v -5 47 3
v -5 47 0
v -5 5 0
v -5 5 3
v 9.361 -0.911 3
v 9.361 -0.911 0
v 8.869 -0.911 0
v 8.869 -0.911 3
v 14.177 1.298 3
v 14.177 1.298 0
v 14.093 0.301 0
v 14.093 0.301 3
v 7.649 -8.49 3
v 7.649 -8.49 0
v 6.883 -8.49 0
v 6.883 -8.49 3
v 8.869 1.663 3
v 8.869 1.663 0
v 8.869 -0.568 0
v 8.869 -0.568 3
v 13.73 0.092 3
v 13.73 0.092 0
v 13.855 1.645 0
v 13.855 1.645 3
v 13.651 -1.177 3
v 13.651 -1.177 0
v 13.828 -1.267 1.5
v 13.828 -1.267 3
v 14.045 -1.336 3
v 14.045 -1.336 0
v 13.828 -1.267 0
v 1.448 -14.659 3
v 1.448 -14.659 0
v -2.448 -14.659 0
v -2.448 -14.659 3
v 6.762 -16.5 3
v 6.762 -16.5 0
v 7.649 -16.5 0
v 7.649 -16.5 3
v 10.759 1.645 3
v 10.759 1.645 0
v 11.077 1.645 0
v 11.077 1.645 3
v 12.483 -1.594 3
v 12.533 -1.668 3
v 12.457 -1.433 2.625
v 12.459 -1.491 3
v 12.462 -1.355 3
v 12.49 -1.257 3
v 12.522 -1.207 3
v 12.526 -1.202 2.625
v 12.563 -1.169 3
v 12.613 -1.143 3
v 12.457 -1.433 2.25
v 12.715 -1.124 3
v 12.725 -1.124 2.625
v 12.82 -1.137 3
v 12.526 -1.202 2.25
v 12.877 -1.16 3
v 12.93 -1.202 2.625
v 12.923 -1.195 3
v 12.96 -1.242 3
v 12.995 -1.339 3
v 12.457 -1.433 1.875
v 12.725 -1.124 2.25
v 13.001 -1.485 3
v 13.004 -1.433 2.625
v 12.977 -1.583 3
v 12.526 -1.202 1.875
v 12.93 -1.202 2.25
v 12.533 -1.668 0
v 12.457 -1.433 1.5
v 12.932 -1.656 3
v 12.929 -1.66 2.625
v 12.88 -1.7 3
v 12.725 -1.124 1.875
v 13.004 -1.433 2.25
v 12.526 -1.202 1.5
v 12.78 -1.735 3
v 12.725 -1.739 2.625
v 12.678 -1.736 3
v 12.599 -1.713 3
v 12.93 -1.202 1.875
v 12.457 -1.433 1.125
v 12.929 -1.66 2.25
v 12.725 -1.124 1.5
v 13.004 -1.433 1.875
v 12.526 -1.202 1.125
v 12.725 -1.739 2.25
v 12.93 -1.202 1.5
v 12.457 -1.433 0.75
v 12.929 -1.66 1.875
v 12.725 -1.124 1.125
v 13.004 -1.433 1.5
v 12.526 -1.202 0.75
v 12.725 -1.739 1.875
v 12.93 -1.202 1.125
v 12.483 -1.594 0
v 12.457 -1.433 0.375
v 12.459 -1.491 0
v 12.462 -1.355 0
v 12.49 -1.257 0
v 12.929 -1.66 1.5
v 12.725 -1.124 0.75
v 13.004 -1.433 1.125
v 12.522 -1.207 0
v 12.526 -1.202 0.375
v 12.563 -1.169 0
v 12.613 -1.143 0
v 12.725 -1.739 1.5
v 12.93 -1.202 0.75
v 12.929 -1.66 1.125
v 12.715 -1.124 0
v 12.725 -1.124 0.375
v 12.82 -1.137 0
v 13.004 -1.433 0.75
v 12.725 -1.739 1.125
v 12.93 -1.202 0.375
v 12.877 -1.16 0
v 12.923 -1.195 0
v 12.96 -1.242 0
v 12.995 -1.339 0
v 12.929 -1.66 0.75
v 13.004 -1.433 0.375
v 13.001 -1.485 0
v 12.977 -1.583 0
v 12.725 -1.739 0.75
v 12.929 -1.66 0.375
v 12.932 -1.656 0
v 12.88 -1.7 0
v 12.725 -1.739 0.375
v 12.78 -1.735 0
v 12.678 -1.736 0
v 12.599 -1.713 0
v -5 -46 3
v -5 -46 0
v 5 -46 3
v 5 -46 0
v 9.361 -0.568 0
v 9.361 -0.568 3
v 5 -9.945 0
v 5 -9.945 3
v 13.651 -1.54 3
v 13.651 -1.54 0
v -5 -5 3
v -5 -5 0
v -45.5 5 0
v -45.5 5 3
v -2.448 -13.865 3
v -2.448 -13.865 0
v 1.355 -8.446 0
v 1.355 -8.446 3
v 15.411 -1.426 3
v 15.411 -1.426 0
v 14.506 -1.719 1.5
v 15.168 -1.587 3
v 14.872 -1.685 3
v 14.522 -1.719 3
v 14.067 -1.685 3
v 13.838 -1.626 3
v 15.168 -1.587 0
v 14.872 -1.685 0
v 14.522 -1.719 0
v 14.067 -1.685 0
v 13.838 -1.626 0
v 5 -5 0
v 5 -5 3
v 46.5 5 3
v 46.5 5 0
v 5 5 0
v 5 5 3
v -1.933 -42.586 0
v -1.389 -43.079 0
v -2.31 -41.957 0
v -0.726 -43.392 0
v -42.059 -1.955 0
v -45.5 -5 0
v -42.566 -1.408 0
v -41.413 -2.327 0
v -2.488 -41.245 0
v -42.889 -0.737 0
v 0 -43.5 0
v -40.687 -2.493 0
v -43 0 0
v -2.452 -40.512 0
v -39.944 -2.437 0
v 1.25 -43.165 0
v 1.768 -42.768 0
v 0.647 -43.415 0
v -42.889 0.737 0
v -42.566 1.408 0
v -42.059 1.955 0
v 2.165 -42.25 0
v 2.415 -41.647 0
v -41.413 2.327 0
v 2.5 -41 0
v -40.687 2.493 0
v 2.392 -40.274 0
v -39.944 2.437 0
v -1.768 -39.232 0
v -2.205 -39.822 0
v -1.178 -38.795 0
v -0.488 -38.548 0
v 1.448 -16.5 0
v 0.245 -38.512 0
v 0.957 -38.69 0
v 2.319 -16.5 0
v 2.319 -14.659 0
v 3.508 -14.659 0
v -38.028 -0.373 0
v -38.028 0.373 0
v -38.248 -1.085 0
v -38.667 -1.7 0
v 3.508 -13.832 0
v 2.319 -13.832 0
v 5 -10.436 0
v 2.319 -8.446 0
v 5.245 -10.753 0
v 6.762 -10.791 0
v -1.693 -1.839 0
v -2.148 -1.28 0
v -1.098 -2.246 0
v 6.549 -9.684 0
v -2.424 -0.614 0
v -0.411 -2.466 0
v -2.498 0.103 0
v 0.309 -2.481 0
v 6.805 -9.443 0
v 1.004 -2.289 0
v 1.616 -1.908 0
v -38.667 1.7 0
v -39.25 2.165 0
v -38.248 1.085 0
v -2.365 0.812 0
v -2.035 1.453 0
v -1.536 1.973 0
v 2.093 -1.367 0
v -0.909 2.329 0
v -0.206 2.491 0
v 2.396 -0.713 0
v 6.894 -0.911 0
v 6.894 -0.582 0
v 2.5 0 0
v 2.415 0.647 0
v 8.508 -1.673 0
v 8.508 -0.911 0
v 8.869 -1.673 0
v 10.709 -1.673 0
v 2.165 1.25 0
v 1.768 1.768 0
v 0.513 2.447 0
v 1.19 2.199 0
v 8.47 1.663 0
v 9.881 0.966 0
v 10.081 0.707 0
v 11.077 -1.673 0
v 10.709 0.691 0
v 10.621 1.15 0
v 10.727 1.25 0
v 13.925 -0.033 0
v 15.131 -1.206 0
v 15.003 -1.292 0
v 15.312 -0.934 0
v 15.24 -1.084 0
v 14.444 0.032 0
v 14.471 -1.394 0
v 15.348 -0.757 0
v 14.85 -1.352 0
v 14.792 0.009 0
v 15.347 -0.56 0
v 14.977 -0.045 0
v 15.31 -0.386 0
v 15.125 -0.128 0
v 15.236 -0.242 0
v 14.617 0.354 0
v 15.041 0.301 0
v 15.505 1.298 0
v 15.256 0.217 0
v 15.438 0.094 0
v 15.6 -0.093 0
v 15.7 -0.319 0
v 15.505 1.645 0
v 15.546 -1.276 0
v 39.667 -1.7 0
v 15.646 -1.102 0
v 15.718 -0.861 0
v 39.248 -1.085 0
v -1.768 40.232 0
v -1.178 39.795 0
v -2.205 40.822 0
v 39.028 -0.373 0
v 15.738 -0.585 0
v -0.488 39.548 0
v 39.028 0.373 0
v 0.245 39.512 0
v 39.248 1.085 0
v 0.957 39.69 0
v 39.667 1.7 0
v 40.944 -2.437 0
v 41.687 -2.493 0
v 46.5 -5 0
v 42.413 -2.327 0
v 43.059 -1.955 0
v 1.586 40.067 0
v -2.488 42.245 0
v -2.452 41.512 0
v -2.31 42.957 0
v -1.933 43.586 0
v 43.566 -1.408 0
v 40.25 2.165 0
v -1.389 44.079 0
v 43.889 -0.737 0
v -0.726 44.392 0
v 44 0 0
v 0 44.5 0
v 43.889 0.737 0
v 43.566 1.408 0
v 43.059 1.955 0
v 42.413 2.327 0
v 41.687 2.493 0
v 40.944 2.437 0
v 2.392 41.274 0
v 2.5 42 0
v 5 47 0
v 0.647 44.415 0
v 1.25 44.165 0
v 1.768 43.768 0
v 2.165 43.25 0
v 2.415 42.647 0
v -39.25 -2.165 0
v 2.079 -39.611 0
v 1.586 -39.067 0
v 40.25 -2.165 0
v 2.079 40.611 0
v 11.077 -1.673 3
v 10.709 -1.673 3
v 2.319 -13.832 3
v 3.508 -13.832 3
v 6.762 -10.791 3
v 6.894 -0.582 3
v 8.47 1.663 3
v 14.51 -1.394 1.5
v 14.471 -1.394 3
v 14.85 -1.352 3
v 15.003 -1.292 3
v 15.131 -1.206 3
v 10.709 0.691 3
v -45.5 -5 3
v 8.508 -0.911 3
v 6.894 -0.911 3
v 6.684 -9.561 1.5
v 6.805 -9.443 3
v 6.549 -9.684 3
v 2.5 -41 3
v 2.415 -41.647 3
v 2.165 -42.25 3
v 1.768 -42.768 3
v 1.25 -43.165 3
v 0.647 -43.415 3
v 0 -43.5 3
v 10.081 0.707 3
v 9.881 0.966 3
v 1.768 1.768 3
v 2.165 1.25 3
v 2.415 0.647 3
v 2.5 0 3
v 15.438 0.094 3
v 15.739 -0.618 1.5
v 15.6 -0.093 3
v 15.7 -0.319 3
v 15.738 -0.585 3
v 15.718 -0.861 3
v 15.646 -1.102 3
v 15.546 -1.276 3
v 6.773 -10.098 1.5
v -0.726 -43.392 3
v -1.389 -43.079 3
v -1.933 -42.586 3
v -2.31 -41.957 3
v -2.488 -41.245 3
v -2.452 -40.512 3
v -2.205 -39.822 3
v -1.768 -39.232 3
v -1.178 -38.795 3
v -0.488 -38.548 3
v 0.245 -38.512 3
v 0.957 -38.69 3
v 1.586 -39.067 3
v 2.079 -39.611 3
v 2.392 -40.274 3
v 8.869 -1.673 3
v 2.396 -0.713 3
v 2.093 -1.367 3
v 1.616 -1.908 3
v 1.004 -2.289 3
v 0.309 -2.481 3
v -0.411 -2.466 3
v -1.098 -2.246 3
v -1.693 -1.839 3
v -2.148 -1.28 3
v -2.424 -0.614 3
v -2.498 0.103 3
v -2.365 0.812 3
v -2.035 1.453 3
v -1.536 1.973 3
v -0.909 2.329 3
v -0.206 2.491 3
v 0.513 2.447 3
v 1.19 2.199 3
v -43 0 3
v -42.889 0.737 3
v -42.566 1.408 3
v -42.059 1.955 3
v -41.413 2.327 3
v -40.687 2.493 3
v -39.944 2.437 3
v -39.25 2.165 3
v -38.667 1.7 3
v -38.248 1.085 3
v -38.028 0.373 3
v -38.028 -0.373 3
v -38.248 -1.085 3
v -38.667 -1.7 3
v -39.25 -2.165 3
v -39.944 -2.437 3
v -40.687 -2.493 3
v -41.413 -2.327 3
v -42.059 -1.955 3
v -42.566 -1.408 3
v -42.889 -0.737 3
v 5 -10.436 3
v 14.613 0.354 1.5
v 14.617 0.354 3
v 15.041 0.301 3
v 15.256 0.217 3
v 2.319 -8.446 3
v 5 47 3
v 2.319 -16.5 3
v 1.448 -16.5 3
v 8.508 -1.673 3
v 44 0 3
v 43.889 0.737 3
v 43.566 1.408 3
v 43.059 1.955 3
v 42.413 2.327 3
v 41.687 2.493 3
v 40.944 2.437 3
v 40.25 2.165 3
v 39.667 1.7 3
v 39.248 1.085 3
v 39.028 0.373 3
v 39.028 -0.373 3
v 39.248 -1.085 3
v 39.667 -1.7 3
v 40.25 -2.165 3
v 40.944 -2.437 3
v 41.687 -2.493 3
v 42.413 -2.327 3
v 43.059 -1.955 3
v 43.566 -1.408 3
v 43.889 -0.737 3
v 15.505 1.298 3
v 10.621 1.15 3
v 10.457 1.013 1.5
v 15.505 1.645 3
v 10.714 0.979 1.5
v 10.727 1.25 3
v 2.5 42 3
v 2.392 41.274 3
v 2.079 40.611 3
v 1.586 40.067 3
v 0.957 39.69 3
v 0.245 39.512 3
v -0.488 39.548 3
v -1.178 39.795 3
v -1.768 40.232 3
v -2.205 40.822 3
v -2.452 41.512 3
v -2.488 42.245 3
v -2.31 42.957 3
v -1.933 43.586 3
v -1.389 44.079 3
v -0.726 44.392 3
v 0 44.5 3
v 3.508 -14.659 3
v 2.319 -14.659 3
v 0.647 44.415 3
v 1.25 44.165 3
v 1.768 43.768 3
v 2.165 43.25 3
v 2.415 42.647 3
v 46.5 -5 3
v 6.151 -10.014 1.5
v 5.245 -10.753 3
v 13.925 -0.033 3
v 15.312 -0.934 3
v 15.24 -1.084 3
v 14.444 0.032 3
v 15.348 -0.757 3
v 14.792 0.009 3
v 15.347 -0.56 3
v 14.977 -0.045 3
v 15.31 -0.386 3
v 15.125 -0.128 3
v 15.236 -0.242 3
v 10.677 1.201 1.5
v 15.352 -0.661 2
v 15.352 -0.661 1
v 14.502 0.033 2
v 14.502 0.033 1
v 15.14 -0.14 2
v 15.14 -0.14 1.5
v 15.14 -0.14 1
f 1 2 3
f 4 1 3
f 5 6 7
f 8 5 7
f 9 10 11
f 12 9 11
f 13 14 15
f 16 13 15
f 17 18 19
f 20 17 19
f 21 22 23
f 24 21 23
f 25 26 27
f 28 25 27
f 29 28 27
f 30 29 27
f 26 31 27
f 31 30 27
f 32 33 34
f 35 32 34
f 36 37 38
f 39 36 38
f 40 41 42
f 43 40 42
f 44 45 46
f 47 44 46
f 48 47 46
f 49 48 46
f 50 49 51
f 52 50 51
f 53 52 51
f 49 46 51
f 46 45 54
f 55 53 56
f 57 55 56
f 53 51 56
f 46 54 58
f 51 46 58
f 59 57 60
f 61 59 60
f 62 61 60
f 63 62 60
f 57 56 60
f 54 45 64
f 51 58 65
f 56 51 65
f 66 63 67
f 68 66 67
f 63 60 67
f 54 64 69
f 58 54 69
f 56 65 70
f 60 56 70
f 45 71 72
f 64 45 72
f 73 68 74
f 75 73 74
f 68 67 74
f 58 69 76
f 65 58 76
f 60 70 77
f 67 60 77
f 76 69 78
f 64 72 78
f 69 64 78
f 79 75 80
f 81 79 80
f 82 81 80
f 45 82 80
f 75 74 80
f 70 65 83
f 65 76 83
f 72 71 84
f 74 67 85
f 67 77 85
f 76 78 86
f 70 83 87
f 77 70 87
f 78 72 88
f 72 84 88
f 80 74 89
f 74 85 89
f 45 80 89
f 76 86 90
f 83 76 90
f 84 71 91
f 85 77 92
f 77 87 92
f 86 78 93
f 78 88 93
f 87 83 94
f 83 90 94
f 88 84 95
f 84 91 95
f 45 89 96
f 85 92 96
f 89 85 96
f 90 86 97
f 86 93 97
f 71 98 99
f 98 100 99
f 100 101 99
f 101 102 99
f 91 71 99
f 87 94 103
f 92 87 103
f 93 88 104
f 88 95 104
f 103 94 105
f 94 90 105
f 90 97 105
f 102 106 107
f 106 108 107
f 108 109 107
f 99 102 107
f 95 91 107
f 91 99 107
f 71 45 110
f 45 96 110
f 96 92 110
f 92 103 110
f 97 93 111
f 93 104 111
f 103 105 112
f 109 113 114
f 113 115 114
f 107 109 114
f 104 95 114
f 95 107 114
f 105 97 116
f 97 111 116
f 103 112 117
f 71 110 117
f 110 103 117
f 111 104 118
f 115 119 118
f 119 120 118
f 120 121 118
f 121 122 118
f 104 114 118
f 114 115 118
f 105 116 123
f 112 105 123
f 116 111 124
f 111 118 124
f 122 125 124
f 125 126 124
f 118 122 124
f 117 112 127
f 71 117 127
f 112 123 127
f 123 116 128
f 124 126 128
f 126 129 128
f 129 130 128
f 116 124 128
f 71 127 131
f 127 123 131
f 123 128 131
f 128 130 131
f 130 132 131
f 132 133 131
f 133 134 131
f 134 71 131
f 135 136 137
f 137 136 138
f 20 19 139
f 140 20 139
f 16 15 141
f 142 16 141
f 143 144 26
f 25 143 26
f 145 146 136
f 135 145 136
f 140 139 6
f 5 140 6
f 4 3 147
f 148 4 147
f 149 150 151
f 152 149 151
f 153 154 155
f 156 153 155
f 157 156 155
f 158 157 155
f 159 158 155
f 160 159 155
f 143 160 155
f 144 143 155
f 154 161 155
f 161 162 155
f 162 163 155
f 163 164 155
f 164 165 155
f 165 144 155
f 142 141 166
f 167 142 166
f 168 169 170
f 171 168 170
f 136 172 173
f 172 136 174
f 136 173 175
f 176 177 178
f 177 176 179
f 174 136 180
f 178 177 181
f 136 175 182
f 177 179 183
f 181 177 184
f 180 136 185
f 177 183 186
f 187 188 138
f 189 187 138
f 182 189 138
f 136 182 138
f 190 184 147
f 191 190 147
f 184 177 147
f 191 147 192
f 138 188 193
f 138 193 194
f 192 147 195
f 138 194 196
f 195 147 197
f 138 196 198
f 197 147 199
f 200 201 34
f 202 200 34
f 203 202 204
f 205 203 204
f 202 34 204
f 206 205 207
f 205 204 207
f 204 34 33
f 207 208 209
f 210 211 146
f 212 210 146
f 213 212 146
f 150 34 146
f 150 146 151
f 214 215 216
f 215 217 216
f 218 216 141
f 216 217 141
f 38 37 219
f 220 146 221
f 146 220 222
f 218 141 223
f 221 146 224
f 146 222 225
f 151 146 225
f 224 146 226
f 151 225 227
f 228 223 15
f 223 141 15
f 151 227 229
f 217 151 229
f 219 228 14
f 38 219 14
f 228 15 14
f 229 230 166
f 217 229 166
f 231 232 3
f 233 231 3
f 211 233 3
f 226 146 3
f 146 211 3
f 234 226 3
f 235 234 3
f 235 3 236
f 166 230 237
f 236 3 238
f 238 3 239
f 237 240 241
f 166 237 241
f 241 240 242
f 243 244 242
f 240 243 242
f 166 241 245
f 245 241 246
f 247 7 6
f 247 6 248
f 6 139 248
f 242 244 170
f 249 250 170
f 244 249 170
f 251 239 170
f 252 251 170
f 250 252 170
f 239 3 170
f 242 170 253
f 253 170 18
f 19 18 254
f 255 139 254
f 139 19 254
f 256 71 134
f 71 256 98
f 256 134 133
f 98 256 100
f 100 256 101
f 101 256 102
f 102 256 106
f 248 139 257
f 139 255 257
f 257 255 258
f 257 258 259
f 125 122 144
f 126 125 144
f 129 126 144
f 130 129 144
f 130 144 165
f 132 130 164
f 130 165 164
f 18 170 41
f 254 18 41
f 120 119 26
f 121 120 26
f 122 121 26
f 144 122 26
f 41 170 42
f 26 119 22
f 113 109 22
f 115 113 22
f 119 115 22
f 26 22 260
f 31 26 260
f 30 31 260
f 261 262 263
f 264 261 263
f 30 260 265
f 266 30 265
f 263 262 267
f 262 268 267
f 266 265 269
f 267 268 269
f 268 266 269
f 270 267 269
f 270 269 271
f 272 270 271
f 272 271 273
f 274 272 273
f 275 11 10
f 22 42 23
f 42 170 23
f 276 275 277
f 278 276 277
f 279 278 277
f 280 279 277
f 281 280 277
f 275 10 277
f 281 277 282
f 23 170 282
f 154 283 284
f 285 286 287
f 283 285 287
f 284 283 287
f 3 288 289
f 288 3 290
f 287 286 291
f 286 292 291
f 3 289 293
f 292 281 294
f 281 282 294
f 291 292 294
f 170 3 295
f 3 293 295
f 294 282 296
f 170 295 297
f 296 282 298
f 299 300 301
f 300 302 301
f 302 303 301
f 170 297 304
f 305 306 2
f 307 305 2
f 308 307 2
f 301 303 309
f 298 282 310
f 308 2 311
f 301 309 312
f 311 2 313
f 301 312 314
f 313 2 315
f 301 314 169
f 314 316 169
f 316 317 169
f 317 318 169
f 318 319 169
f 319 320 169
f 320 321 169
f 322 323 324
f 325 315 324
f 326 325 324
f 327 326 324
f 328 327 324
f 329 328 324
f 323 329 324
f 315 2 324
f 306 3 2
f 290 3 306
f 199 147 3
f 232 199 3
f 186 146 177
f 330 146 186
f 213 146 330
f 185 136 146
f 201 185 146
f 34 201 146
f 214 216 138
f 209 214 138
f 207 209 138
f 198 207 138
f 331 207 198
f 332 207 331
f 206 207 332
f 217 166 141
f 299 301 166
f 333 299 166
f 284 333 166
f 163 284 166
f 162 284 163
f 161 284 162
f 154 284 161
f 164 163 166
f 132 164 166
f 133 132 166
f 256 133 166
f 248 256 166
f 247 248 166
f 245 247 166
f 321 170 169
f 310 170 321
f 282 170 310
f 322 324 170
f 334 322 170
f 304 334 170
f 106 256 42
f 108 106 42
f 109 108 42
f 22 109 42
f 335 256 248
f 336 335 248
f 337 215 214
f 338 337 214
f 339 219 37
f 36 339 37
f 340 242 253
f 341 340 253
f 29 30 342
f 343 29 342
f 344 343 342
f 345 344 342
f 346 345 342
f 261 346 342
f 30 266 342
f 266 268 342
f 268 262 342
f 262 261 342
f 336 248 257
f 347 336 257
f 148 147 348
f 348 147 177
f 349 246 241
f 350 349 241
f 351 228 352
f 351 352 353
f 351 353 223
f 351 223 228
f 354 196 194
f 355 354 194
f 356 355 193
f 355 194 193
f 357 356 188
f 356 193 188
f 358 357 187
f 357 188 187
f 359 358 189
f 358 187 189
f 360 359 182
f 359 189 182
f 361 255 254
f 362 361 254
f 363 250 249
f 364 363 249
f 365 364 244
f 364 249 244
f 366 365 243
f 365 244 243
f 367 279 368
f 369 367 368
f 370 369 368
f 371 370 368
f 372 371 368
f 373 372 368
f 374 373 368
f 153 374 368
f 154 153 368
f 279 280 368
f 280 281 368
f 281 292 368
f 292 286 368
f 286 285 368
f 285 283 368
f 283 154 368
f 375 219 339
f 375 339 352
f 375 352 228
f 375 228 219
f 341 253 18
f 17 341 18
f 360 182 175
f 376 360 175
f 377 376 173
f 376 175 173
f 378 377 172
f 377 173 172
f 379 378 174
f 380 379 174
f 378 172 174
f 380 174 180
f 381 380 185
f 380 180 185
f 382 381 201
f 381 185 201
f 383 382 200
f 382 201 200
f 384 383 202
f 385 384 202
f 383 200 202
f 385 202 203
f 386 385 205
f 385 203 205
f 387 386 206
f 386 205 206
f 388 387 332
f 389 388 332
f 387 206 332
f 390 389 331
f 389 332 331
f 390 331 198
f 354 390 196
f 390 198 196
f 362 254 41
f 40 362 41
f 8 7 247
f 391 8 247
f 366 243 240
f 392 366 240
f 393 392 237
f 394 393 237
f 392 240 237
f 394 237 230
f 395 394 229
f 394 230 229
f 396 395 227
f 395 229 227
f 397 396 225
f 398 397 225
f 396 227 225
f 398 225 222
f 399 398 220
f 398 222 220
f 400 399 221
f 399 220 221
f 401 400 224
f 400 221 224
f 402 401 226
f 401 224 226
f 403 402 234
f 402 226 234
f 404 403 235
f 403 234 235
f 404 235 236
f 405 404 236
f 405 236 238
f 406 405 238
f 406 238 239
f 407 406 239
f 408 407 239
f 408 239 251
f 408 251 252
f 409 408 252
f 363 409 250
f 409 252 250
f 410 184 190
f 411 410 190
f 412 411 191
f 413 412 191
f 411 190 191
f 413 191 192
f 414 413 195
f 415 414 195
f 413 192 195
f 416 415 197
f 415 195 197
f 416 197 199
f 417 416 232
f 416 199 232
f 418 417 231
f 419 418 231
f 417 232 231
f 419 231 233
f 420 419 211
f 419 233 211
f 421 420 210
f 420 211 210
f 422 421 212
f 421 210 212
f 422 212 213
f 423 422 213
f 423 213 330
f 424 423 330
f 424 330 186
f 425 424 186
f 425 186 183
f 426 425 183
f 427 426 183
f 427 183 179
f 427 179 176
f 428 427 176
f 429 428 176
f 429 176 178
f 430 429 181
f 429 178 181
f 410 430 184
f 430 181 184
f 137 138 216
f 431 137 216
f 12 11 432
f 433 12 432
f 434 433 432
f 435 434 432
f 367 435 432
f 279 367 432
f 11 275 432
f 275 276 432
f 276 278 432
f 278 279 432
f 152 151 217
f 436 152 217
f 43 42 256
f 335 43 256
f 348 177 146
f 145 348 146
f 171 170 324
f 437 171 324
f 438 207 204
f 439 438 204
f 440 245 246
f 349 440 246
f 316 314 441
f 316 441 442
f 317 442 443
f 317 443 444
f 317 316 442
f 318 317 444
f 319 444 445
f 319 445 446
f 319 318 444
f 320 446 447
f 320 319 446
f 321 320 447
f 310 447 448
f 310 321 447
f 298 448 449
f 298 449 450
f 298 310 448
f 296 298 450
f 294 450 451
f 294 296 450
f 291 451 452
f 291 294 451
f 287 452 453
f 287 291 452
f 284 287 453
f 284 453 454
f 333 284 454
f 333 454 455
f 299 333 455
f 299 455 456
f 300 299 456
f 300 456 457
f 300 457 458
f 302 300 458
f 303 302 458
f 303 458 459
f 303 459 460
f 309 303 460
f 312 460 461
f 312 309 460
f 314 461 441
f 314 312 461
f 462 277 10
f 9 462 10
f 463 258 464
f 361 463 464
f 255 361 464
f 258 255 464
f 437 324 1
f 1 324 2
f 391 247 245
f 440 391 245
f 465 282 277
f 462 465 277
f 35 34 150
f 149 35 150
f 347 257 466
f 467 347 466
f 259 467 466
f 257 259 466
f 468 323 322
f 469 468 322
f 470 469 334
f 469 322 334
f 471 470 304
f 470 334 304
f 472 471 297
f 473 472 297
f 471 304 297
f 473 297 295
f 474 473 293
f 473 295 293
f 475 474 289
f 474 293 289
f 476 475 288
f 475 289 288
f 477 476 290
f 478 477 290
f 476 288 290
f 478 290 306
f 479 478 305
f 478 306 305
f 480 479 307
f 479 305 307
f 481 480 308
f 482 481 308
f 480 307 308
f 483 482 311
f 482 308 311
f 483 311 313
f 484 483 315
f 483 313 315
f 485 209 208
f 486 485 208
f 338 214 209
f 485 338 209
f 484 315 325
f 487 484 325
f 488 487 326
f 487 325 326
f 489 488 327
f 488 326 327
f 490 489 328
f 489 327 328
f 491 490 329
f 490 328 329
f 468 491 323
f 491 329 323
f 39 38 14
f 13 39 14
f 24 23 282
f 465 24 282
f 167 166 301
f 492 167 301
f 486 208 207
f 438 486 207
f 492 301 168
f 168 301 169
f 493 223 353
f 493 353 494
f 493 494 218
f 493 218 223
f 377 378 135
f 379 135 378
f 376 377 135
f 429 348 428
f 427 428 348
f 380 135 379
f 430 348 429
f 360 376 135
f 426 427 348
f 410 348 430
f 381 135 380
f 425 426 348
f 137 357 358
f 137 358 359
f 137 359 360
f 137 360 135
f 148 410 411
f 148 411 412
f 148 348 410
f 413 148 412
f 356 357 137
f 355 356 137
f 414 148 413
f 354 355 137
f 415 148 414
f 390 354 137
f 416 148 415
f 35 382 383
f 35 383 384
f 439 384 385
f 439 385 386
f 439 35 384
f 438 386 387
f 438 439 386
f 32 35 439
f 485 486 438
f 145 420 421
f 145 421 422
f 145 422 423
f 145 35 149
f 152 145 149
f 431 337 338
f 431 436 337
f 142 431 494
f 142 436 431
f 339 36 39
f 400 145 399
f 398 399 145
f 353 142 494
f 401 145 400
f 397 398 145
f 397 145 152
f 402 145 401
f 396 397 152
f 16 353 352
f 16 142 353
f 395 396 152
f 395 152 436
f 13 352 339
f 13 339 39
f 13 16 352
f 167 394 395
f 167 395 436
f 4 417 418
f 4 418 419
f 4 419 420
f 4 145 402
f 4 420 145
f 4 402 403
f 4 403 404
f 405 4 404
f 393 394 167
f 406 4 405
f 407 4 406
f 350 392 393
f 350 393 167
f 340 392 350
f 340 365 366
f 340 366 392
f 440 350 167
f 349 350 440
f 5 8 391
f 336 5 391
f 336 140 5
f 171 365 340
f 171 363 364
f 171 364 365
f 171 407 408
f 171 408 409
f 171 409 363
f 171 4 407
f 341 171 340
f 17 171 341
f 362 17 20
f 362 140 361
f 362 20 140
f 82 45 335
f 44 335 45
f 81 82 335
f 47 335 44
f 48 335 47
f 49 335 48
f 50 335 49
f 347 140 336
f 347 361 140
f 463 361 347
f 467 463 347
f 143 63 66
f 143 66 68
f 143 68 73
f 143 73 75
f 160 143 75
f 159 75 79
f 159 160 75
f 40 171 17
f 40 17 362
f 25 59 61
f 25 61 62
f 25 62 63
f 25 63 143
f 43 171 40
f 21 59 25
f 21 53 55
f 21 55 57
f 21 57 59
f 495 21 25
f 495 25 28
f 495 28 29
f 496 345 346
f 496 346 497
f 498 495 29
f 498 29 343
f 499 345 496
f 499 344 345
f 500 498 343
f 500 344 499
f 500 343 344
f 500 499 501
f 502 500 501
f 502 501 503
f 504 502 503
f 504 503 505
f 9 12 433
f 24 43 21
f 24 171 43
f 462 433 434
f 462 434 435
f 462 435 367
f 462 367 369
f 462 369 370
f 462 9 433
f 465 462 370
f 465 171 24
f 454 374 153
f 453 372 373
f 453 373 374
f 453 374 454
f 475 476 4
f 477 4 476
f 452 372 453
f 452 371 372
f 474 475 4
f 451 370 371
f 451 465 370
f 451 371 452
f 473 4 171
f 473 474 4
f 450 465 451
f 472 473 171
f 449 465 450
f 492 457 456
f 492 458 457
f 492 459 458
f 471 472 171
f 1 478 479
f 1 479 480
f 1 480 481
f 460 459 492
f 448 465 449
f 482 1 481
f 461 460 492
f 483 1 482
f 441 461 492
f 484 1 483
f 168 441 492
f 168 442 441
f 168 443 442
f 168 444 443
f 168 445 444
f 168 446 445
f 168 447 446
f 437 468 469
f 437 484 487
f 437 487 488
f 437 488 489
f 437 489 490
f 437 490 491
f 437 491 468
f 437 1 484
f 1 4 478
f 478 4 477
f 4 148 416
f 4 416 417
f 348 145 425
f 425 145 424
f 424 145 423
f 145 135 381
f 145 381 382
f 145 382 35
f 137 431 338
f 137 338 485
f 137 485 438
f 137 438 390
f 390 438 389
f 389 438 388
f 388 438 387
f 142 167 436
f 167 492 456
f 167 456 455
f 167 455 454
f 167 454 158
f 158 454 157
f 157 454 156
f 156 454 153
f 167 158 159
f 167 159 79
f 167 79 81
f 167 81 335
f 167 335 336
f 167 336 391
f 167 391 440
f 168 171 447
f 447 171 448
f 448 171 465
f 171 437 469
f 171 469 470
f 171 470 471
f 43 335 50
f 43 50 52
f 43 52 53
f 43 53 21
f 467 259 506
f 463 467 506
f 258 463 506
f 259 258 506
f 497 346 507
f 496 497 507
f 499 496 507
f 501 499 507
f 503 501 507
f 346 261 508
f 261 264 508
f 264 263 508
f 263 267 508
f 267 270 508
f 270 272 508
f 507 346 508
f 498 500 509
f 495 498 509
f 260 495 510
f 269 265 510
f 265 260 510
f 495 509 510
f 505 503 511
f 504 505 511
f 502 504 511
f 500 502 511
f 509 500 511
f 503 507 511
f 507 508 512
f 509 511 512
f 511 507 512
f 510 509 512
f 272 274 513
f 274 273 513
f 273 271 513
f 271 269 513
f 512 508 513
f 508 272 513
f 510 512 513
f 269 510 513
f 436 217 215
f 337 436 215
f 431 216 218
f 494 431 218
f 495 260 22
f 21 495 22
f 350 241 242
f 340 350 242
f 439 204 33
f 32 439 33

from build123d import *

# Parameters (mm, degrees)
F0_R     = 2.5
F1_DEPTH = 3


with BuildPart() as f1:
    # F0 (on Top) → F1 (new body)
    with BuildSketch(Plane.XY):
        Polygon((5, 47), (0, 47), (-5, 47), (-5, 5), (-45.5, 5), (-45.5, 0), (-45.5, -5), (-5, -5), (-5, -46), (0, -46), (5, -46), (5, -10.4356960682), (4.7629147731, -10.1287784653), (5, -9.9454247125), (5, -5), (46.5, -5), (46.5, 0), (46.5, 5), (5, 5), align=None)
        with BuildLine():
            ThreePointArc((2.5, -41), (1.767766953, -42.767766953), (0, -43.5))
            ThreePointArc((0, -43.5), (-1.767766953, -39.232233047), (2.5, -41))
        make_face(mode=Mode.SUBTRACT)
        with BuildLine():
            ThreePointArc((-38, 0), (-40.5, -2.5), (-43, 0))
            ThreePointArc((-43, 0), (-40.5, 2.5), (-38, 0))
        make_face(mode=Mode.SUBTRACT)
        with BuildLine():
            ThreePointArc((2.5, 0), (-2.3096988313, -0.9567085809), (1.767766953, 1.767766953))
            ThreePointArc((1.767766953, 1.767766953), (2.3096988313, 0.9567085809), (2.5, 0))
        make_face(mode=Mode.SUBTRACT)
        Polygon((3.5076020164, -13.8316004514), (3.5076020164, -14.659125062), (2.3189120038, -14.659125062), (2.3189120038, -16.5000166744), (1.4475566406, -16.5000166744), (1.4475566406, -14.659125062), (-2.4481206573, -14.659125062), (-2.4481206573, -13.8649118235), (1.3546354449, -8.4456775625), (2.3189120038, -8.4456775625), (2.3189120038, -13.8316004514), align=None, mode=Mode.SUBTRACT)
        Polygon((9.3614297288, -0.567920358), (9.3614297288, -0.9107060472), (8.869038421, -0.9107060472), (8.869038421, -1.6732589575), (8.5080967101, -1.6732589575), (8.5080967101, -0.9107060472), (6.8943895038, -0.9107060472), (6.8943895038, -0.5817189344), (8.4696059442, 1.6630915853), (8.869038421, 1.6630915853), (8.869038421, -0.567920358), align=None, mode=Mode.SUBTRACT)
        with BuildLine():
            Line((11.0768106565, 1.6449355636), (11.0768106565, -1.6732589575))
            Line((11.0768106565, -1.6732589575), (10.7093327779, -1.6732589575))
            Line((10.7093327779, -1.6732589575), (10.7093327779, 0.6913813053))
            add(Edge.make_bspline(
                [(10.7093327779, 0.6913813053), (10.7093327779, 0.9869613382), (10.7274887995, 1.249860532)],
                knots=[0, 0, 0, 1, 1, 1], degree=2))
            add(Edge.make_bspline(
                [(10.7274887995, 1.249860532), (10.6802831432, 1.2019286348), (10.6210945125, 1.1500024128)],
                knots=[0, 0, 0, 1, 1, 1], degree=2))
            add(Edge.make_bspline(
                [(10.6210945125, 1.1500024128), (10.5619058819, 1.0980761908), (10.0811344279, 0.7073586044)],
                knots=[0, 0, 0, 1, 1, 1], degree=2))
            Line((10.0811344279, 0.7073586044), (9.8814181895, 0.965900353))
            Line((9.8814181895, 0.965900353), (10.7594433977, 1.6449355636))
            Line((10.7594433977, 1.6449355636), (11.0768106565, 1.6449355636))
        make_face(mode=Mode.SUBTRACT)
        with BuildLine():
            add(Edge.make_bspline(
                [(12.5325604743, -1.667812151), (12.4566683037, -1.5962774256), (12.4566683037, -1.4328732305)],
                knots=[0, 0, 0, 1, 1, 1], degree=2))
            add(Edge.make_bspline(
                [(12.4566683037, -1.4328732305), (12.4566683037, -1.2803626484), (12.5260243065, -1.2022917552)],
                knots=[0, 0, 0, 1, 1, 1], degree=2))
            add(Edge.make_bspline(
                [(12.5260243065, -1.2022917552), (12.5953803093, -1.124220862), (12.7246511836, -1.124220862)],
                knots=[0, 0, 0, 1, 1, 1], degree=2))
            add(Edge.make_bspline(
                [(12.7246511836, -1.124220862), (12.8561007806, -1.124220862), (12.9298142286, -1.2022917552)],
                knots=[0, 0, 0, 1, 1, 1], degree=2))
            add(Edge.make_bspline(
                [(12.9298142286, -1.2022917552), (13.0035276766, -1.2803626484), (13.0035276766, -1.4328732305)],
                knots=[0, 0, 0, 1, 1, 1], degree=2))
            add(Edge.make_bspline(
                [(13.0035276766, -1.4328732305), (13.0035276766, -1.5803001265), (12.9287248673, -1.6598235014)],
                knots=[0, 0, 0, 1, 1, 1], degree=2))
            add(Edge.make_bspline(
                [(12.9287248673, -1.6598235014), (12.853922058, -1.7393468763), (12.7246511836, -1.7393468763)],
                knots=[0, 0, 0, 1, 1, 1], degree=2))
            add(Edge.make_bspline(
                [(12.7246511836, -1.7393468763), (12.6084526449, -1.7393468763), (12.5325604743, -1.667812151)],
                knots=[0, 0, 0, 1, 1, 1], degree=2))
        make_face(mode=Mode.SUBTRACT)
        with BuildLine():
            add(Edge.make_bspline(
                [(14.092888977, 0.3013899598), (14.3536094482, 0.3536793022), (14.6128774377, 0.3536793022)],
                knots=[0, 0, 0, 1, 1, 1], degree=2))
            add(Edge.make_bspline(
                [(14.6128774377, 0.3536793022), (15.1372233437, 0.3536793022), (15.4378870626, 0.0936850718)],
                knots=[0, 0, 0, 1, 1, 1], degree=2))
            add(Edge.make_bspline(
                [(15.4378870626, 0.0936850718), (15.7385507815, -0.1663091585), (15.7385507815, -0.6180309778)],
                knots=[0, 0, 0, 1, 1, 1], degree=2))
            add(Edge.make_bspline(
                [(15.7385507815, -0.6180309778), (15.7385507815, -1.1329357524), (15.4106530301, -1.4259739423)],
                knots=[0, 0, 0, 1, 1, 1], degree=2))
            add(Edge.make_bspline(
                [(15.4106530301, -1.4259739423), (15.0827552786, -1.7190121321), (14.5061200303, -1.7190121321)],
                knots=[0, 0, 0, 1, 1, 1], degree=2))
            add(Edge.make_bspline(
                [(14.5061200303, -1.7190121321), (13.945462081, -1.7190121321), (13.650608289, -1.5396306379)],
                knots=[0, 0, 0, 1, 1, 1], degree=2))
            Line((13.650608289, -1.5396306379), (13.650608289, -1.1765102045))
            add(Edge.make_bspline(
                [(13.650608289, -1.1765102045), (13.808928798, -1.2781839258), (14.0449570798, -1.3362831952)],
                knots=[0, 0, 0, 1, 1, 1], degree=2))
            add(Edge.make_bspline(
                [(14.0449570798, -1.3362831952), (14.2809853615, -1.3943824645), (14.5104774755, -1.3943824645)],
                knots=[0, 0, 0, 1, 1, 1], degree=2))
            add(Edge.make_bspline(
                [(14.5104774755, -1.3943824645), (14.9099099523, -1.3943824645), (15.1310502963, -1.2059229596)],
                knots=[0, 0, 0, 1, 1, 1], degree=2))
            add(Edge.make_bspline(
                [(15.1310502963, -1.2059229596), (15.3521906403, -1.0174634546), (15.3521906403, -0.6608791889)],
                knots=[0, 0, 0, 1, 1, 1], degree=2))
            add(Edge.make_bspline(
                [(15.3521906403, -0.6608791889), (15.3521906403, 0.0334070799), (14.5017625851, 0.0334070799)],
                knots=[0, 0, 0, 1, 1, 1], degree=2))
            add(Edge.make_bspline(
                [(14.5017625851, 0.0334070799), (14.2860690476, 0.0334070799), (13.9251273367, -0.032680839)],
                knots=[0, 0, 0, 1, 1, 1], degree=2))
            Line((13.9251273367, -0.032680839), (13.7297685435, 0.0922325901))
            Line((13.7297685435, 0.0922325901), (13.8546819726, 1.6449355636))
            Line((13.8546819726, 1.6449355636), (15.5047012223, 1.6449355636))
            Line((15.5047012223, 1.6449355636), (15.5047012223, 1.2977924292))
            Line((15.5047012223, 1.2977924292), (14.1771329175, 1.2977924292))
            Line((14.1771329175, 1.2977924292), (14.092888977, 0.3013899598))
        make_face(mode=Mode.SUBTRACT)
        with Locations((41.5, 0)):
            Circle(F0_R, mode=Mode.SUBTRACT)
        with BuildLine():
            ThreePointArc((0, 44.5), (1.767766953, 43.767766953), (2.5, 42))
            ThreePointArc((2.5, 42), (-1.767766953, 40.232233047), (0, 44.5))
        make_face(mode=Mode.SUBTRACT)
        with BuildLine():
            Line((6.8825699725, -8.4895083152), (5, -9.9454247125))
            Line((5, -9.9454247125), (5, -10.4356960682))
            Line((5, -10.4356960682), (5.2450530525, -10.7529283834))
            add(Edge.make_bspline(
                [(6.5485796371, -9.6843346332), (6.4056913834, -9.8096905858), (5.2450530525, -10.7529283834)],
                knots=[0, 0, 0, 1, 1, 1], degree=2))
            add(Edge.make_bspline(
                [(6.8054278478, -9.4432654934), (6.6914678909, -9.5589786805), (6.5485796371, -9.6843346332)],
                knots=[0, 0, 0, 1, 1, 1], degree=2))
            add(Edge.make_bspline(
                [(6.7615970951, -10.7914994458), (6.7615970951, -10.0779347922), (6.8054278478, -9.4432654934)],
                knots=[0, 0, 0, 1, 1, 1], degree=2))
            Line((6.7615970951, -10.7914994458), (6.7615970951, -16.5000166744))
            Line((6.7615970951, -16.5000166744), (7.6487315293, -16.5000166744))
            Line((7.6487315293, -16.5000166744), (7.6487315293, -8.4895083152))
            Line((7.6487315293, -8.4895083152), (6.8825699725, -8.4895083152))
        make_face()
        Polygon((5, -10.4356960682), (5, -9.9454247125), (4.7629147731, -10.1287784653), align=None)
    extrude(amount=F1_DEPTH)


solid = f1.part
